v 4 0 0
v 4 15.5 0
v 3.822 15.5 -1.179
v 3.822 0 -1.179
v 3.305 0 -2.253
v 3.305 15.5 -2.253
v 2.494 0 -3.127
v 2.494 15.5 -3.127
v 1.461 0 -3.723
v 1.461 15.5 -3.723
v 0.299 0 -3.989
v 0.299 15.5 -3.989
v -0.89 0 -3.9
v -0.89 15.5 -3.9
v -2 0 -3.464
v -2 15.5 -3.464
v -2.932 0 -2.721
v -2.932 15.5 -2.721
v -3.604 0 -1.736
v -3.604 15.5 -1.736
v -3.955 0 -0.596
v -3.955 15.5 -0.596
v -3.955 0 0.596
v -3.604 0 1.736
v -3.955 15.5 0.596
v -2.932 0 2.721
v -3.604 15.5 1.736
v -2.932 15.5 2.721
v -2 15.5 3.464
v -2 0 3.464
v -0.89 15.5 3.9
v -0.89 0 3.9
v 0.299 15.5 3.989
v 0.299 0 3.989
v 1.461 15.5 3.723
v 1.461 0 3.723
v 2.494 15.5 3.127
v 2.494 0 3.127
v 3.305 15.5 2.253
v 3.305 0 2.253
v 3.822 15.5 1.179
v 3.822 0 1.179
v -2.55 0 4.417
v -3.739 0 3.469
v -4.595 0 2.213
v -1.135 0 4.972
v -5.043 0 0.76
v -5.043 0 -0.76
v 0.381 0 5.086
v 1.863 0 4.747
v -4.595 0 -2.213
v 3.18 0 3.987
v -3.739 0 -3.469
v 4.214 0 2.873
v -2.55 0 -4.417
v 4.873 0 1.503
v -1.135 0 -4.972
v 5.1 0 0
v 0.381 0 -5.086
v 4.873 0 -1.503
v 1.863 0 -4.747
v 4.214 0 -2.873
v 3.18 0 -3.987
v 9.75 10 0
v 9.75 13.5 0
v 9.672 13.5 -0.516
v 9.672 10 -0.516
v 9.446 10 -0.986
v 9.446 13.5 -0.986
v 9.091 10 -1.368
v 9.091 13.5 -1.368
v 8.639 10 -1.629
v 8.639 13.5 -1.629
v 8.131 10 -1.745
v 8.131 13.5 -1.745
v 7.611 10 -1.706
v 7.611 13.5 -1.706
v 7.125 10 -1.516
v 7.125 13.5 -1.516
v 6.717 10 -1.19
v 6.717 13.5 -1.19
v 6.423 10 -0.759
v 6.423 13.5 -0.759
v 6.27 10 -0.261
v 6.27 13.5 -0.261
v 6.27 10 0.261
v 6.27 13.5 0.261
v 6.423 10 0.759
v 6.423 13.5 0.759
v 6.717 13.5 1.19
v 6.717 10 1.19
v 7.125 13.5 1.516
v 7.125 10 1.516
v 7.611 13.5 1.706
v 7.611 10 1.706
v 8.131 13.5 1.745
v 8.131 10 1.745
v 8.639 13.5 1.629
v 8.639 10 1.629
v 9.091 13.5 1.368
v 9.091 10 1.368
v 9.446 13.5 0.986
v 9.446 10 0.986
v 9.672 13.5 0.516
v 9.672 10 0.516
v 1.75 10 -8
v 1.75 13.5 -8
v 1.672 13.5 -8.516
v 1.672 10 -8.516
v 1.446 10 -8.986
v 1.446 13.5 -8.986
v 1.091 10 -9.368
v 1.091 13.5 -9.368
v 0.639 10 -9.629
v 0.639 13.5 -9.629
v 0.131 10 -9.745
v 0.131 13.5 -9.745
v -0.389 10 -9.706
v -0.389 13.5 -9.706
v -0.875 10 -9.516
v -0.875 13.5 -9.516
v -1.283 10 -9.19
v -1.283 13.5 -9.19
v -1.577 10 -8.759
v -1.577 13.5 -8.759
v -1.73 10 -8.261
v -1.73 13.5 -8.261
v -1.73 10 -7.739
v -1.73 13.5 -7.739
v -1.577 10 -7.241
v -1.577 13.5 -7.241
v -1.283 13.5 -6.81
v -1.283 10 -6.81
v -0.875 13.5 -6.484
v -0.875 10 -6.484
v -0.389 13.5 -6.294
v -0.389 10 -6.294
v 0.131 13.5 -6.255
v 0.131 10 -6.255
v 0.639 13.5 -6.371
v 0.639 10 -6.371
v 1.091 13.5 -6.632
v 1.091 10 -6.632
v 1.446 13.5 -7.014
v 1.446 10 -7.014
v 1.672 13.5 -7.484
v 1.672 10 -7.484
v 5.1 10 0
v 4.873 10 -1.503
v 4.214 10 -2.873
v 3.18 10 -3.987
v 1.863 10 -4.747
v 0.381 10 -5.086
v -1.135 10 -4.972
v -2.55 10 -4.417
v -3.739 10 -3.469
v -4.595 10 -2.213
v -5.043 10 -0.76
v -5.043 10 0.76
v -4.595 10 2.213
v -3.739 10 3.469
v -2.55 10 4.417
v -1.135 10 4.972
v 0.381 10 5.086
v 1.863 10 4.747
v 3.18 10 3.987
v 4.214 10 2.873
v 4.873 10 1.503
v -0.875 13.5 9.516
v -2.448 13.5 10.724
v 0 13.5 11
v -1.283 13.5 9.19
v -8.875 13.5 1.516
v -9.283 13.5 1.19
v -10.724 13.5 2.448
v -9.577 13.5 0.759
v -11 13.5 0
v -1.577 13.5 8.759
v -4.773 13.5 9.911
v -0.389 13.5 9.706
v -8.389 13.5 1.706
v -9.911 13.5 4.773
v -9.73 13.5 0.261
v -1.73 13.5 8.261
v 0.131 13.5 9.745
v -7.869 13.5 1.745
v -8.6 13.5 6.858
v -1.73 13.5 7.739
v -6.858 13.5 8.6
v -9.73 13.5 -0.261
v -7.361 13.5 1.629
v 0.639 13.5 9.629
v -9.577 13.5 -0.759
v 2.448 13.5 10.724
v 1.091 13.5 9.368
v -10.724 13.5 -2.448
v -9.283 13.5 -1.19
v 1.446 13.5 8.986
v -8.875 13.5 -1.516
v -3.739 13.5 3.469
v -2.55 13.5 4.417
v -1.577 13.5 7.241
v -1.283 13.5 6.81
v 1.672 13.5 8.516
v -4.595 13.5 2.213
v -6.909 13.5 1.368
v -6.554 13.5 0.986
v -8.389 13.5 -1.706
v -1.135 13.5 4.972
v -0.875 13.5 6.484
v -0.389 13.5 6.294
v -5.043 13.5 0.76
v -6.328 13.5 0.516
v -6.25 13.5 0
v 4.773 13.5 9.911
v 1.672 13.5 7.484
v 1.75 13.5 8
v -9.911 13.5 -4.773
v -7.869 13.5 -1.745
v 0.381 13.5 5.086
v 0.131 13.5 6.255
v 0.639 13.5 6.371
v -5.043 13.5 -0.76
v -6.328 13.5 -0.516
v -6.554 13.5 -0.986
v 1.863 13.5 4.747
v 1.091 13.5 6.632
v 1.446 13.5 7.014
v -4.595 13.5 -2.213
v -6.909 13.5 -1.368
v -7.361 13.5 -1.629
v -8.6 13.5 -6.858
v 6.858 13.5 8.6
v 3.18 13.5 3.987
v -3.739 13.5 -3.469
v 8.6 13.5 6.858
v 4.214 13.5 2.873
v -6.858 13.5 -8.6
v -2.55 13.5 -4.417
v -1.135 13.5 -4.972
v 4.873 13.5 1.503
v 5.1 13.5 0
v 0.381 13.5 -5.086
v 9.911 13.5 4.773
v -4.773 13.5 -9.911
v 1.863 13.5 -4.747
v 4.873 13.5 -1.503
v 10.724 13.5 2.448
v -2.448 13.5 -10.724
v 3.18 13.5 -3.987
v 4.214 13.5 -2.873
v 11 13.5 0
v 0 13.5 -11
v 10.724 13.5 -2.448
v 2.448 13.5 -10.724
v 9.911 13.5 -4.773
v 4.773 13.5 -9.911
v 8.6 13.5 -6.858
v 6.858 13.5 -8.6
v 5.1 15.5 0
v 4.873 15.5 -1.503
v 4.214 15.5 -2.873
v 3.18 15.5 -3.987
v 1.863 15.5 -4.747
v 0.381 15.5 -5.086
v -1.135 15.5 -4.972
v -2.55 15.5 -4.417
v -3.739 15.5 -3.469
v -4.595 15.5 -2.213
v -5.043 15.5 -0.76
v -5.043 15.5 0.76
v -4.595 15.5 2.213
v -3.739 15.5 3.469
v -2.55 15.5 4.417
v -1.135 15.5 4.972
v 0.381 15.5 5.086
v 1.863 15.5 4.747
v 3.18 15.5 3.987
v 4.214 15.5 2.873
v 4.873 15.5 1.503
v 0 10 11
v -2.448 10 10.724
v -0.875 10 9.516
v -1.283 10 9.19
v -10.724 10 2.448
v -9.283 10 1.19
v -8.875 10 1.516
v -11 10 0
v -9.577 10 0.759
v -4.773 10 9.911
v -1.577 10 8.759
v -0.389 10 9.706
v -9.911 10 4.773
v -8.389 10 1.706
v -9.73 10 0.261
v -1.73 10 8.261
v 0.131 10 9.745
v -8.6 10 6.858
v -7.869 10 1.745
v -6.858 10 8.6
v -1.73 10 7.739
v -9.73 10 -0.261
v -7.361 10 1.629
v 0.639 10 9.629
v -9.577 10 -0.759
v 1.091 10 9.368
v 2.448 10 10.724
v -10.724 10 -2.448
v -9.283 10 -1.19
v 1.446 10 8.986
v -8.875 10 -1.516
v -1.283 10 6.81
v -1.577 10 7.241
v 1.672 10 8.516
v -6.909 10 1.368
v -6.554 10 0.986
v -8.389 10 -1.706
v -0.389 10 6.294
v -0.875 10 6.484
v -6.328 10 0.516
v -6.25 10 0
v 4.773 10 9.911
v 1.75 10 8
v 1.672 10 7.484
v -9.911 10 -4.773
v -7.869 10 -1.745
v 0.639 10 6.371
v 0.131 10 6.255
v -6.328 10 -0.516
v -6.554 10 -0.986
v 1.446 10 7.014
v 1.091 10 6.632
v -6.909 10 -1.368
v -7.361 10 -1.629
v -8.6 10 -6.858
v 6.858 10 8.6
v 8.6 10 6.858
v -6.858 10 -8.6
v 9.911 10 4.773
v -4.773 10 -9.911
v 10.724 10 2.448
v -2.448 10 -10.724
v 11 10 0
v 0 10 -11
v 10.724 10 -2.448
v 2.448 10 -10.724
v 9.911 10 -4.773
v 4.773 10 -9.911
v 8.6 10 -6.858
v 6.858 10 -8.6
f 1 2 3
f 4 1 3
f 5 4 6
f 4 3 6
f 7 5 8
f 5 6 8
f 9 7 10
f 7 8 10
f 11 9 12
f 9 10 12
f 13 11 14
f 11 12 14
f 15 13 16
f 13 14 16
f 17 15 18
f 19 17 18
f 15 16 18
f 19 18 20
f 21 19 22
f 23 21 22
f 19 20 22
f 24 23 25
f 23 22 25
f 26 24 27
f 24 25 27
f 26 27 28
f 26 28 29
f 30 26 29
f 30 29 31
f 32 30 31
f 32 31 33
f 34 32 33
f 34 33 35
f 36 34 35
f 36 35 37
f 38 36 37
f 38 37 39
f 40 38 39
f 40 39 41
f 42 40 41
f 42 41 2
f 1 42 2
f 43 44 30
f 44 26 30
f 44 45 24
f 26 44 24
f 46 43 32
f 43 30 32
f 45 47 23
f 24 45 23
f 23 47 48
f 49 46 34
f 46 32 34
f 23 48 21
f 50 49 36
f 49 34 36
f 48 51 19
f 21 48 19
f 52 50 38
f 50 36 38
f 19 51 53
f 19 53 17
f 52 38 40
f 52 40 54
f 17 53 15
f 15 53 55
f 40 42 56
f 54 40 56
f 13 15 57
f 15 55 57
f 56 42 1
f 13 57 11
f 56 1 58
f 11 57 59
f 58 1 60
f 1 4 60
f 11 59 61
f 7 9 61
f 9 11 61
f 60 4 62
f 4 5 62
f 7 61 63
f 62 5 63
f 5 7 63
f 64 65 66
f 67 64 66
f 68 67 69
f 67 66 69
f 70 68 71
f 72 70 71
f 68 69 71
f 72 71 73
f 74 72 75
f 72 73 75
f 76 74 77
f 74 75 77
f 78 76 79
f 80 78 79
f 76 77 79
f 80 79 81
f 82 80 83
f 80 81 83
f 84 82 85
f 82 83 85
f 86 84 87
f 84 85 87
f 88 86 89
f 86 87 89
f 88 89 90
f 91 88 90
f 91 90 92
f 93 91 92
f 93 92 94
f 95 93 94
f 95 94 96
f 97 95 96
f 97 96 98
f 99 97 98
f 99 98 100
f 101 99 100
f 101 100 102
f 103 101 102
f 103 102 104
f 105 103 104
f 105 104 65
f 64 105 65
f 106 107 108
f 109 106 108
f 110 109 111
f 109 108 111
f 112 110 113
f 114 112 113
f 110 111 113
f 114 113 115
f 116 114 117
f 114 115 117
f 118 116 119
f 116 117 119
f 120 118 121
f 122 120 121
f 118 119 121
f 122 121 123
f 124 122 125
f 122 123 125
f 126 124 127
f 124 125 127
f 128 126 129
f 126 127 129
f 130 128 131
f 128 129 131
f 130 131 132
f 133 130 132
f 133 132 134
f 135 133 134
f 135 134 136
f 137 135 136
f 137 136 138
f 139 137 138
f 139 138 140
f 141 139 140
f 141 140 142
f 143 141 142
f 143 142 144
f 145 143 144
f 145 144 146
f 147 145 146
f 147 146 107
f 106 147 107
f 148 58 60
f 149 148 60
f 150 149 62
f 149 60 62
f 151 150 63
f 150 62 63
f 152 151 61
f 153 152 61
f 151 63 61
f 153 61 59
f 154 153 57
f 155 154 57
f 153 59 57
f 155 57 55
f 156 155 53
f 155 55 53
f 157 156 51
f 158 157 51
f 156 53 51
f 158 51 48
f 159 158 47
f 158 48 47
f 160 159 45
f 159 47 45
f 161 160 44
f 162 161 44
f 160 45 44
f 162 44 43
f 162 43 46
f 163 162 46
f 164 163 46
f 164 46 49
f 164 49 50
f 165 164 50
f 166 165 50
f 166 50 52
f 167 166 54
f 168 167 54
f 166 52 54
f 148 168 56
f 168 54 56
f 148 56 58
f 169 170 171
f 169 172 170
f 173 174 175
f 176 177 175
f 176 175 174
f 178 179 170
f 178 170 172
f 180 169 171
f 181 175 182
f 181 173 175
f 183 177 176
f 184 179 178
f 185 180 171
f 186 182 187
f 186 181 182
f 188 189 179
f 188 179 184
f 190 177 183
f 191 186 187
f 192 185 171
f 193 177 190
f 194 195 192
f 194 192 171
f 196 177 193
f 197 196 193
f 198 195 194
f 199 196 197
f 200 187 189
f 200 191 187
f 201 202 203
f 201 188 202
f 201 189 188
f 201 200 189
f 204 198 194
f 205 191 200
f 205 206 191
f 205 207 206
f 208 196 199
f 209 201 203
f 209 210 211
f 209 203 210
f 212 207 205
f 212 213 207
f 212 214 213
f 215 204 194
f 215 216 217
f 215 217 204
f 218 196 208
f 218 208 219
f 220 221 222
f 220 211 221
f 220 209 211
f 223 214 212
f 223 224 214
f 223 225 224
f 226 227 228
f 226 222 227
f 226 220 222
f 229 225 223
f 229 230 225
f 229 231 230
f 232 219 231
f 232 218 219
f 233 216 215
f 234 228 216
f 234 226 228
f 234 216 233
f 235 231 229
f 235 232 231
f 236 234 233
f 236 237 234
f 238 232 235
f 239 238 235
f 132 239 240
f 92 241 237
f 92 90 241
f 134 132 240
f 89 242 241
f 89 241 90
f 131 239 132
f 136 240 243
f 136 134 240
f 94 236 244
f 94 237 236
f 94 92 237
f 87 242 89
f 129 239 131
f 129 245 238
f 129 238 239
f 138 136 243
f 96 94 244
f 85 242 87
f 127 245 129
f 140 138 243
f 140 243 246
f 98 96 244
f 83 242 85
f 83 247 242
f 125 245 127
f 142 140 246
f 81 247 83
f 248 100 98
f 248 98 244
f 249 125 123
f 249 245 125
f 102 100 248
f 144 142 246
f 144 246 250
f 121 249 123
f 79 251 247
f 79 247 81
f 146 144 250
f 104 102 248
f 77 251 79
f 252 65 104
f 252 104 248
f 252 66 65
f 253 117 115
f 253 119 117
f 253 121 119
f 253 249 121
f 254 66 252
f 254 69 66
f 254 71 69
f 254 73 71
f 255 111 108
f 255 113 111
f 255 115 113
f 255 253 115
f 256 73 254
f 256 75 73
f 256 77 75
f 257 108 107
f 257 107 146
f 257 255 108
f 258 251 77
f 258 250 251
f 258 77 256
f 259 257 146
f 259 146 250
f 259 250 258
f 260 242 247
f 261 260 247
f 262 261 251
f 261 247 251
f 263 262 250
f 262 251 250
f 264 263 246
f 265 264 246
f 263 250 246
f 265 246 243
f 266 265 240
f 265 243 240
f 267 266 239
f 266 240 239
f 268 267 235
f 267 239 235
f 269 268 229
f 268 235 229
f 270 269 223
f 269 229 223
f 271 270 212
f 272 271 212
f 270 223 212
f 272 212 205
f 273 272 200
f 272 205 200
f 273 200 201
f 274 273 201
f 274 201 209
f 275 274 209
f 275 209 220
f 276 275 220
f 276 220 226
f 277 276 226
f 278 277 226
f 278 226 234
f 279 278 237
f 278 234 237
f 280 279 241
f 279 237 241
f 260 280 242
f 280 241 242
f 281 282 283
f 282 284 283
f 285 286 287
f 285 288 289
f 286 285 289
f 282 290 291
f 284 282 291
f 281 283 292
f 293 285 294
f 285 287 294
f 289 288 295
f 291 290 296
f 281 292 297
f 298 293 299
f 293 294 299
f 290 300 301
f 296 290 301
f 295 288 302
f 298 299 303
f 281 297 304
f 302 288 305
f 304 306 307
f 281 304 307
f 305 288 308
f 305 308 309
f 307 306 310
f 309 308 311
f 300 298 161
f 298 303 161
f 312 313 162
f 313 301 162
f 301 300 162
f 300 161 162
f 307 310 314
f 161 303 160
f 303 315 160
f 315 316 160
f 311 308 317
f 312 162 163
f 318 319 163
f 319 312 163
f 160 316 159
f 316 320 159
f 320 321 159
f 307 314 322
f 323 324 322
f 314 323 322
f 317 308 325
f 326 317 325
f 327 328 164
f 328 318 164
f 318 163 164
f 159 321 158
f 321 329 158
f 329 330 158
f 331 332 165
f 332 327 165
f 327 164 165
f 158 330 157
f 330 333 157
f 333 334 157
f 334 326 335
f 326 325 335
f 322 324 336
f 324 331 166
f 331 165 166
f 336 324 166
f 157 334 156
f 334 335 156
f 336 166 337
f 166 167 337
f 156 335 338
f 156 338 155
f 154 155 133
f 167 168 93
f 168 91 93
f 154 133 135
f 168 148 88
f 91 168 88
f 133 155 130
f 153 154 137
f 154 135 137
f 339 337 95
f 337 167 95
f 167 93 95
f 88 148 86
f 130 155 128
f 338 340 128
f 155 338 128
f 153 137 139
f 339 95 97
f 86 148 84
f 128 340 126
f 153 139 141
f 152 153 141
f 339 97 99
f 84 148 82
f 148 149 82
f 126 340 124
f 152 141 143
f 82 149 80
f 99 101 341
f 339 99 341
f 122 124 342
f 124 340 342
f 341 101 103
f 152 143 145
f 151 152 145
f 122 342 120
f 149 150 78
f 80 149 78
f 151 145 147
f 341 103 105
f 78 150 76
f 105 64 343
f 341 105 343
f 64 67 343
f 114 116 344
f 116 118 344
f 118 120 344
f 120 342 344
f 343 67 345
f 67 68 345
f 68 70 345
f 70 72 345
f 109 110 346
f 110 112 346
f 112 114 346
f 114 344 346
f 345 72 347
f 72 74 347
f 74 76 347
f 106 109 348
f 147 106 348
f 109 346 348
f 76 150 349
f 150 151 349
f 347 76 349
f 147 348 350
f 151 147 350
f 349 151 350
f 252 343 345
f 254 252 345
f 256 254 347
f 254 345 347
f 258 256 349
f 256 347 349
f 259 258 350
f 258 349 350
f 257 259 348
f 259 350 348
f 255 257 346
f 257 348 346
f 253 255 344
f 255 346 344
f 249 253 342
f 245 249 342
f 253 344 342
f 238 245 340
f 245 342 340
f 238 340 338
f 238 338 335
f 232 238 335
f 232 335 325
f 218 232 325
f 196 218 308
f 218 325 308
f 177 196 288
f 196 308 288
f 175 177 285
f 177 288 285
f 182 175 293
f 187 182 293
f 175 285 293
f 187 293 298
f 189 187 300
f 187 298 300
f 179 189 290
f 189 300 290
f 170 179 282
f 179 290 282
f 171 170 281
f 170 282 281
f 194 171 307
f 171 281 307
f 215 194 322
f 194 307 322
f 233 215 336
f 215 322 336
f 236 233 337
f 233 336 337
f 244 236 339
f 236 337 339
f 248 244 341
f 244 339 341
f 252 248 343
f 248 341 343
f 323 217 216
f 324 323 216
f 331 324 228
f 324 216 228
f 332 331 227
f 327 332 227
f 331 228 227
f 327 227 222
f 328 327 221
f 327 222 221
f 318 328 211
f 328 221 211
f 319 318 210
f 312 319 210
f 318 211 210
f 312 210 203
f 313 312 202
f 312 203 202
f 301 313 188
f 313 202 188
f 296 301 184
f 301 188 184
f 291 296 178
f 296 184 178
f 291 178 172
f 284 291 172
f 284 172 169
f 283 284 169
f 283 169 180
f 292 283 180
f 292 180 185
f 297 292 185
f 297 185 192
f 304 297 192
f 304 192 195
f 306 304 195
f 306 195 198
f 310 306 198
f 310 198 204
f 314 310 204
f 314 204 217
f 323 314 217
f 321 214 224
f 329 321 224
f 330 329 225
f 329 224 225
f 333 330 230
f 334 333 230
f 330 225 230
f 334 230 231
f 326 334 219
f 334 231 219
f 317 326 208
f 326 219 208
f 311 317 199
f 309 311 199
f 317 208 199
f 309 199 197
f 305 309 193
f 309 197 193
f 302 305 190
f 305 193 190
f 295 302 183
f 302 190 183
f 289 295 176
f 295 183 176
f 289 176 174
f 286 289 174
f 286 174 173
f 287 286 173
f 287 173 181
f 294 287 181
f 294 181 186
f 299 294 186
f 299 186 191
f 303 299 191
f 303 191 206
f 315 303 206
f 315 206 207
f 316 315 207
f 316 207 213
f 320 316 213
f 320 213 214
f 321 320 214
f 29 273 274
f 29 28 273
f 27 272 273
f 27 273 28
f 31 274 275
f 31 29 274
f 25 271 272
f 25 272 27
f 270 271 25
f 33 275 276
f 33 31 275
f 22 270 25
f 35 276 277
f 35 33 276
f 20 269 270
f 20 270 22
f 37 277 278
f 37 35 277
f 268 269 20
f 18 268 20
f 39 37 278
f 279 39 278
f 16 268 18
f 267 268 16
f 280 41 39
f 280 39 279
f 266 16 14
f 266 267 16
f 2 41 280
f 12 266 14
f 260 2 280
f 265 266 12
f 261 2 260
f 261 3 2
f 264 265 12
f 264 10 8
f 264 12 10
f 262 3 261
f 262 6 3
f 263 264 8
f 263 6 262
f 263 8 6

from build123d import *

# Parameters (mm, degrees)
SKETCH_1_R          = 5.1
EXTRUDE_1_DEPTH     = 10
SKETCH_2_R          = 11
EXTRUDE_2_DEPTH     = 3.5
SKETCH_3_R          = 5.1
EXTRUDE_3_DEPTH     = 2
SKETCH_4_R          = 4
SKETCH_4_R_2        = 1.75
CUT_EXTRUDE_1_DEPTH = 16.5


with BuildPart() as part:
    # 草图1 → 凸台-拉伸1 (new body)
    with BuildSketch(Plane(origin=(0, 0, 0), x_dir=(1, 0, 0), z_dir=(0, 1, 0))):
        Circle(SKETCH_1_R)
    extrude(amount=EXTRUDE_1_DEPTH)

    # 草图2 → 凸台-拉伸2 (add)
    with BuildSketch(Plane(origin=(0, 10, 0), x_dir=(1, 0, 0), z_dir=(0, 1, 0))):
        Circle(SKETCH_2_R)
    extrude(amount=EXTRUDE_2_DEPTH)

    # 草图3 → 凸台-拉伸3 (add)
    with BuildSketch(Plane(origin=(0, 13.5, 0), x_dir=(1, 0, 0), z_dir=(0, 1, 0))):
        Circle(SKETCH_3_R)
    extrude(amount=EXTRUDE_3_DEPTH)

    # 草图4 → 切除-拉伸1 (cut, through all)
    with BuildSketch(Plane(origin=(0, 15.5, 0), x_dir=(1, 0, 0), z_dir=(0, 1, 0))):
        Circle(SKETCH_4_R)
        with Locations((-8, 0)):
            Circle(SKETCH_4_R_2)
        with Locations((0, -8)):
            Circle(SKETCH_4_R_2)
        with Locations((8, 0)):
            Circle(SKETCH_4_R_2)
        with Locations((0, 8)):
            Circle(SKETCH_4_R_2)
    extrude(amount=-CUT_EXTRUDE_1_DEPTH, mode=Mode.SUBTRACT)


solid = part.part
